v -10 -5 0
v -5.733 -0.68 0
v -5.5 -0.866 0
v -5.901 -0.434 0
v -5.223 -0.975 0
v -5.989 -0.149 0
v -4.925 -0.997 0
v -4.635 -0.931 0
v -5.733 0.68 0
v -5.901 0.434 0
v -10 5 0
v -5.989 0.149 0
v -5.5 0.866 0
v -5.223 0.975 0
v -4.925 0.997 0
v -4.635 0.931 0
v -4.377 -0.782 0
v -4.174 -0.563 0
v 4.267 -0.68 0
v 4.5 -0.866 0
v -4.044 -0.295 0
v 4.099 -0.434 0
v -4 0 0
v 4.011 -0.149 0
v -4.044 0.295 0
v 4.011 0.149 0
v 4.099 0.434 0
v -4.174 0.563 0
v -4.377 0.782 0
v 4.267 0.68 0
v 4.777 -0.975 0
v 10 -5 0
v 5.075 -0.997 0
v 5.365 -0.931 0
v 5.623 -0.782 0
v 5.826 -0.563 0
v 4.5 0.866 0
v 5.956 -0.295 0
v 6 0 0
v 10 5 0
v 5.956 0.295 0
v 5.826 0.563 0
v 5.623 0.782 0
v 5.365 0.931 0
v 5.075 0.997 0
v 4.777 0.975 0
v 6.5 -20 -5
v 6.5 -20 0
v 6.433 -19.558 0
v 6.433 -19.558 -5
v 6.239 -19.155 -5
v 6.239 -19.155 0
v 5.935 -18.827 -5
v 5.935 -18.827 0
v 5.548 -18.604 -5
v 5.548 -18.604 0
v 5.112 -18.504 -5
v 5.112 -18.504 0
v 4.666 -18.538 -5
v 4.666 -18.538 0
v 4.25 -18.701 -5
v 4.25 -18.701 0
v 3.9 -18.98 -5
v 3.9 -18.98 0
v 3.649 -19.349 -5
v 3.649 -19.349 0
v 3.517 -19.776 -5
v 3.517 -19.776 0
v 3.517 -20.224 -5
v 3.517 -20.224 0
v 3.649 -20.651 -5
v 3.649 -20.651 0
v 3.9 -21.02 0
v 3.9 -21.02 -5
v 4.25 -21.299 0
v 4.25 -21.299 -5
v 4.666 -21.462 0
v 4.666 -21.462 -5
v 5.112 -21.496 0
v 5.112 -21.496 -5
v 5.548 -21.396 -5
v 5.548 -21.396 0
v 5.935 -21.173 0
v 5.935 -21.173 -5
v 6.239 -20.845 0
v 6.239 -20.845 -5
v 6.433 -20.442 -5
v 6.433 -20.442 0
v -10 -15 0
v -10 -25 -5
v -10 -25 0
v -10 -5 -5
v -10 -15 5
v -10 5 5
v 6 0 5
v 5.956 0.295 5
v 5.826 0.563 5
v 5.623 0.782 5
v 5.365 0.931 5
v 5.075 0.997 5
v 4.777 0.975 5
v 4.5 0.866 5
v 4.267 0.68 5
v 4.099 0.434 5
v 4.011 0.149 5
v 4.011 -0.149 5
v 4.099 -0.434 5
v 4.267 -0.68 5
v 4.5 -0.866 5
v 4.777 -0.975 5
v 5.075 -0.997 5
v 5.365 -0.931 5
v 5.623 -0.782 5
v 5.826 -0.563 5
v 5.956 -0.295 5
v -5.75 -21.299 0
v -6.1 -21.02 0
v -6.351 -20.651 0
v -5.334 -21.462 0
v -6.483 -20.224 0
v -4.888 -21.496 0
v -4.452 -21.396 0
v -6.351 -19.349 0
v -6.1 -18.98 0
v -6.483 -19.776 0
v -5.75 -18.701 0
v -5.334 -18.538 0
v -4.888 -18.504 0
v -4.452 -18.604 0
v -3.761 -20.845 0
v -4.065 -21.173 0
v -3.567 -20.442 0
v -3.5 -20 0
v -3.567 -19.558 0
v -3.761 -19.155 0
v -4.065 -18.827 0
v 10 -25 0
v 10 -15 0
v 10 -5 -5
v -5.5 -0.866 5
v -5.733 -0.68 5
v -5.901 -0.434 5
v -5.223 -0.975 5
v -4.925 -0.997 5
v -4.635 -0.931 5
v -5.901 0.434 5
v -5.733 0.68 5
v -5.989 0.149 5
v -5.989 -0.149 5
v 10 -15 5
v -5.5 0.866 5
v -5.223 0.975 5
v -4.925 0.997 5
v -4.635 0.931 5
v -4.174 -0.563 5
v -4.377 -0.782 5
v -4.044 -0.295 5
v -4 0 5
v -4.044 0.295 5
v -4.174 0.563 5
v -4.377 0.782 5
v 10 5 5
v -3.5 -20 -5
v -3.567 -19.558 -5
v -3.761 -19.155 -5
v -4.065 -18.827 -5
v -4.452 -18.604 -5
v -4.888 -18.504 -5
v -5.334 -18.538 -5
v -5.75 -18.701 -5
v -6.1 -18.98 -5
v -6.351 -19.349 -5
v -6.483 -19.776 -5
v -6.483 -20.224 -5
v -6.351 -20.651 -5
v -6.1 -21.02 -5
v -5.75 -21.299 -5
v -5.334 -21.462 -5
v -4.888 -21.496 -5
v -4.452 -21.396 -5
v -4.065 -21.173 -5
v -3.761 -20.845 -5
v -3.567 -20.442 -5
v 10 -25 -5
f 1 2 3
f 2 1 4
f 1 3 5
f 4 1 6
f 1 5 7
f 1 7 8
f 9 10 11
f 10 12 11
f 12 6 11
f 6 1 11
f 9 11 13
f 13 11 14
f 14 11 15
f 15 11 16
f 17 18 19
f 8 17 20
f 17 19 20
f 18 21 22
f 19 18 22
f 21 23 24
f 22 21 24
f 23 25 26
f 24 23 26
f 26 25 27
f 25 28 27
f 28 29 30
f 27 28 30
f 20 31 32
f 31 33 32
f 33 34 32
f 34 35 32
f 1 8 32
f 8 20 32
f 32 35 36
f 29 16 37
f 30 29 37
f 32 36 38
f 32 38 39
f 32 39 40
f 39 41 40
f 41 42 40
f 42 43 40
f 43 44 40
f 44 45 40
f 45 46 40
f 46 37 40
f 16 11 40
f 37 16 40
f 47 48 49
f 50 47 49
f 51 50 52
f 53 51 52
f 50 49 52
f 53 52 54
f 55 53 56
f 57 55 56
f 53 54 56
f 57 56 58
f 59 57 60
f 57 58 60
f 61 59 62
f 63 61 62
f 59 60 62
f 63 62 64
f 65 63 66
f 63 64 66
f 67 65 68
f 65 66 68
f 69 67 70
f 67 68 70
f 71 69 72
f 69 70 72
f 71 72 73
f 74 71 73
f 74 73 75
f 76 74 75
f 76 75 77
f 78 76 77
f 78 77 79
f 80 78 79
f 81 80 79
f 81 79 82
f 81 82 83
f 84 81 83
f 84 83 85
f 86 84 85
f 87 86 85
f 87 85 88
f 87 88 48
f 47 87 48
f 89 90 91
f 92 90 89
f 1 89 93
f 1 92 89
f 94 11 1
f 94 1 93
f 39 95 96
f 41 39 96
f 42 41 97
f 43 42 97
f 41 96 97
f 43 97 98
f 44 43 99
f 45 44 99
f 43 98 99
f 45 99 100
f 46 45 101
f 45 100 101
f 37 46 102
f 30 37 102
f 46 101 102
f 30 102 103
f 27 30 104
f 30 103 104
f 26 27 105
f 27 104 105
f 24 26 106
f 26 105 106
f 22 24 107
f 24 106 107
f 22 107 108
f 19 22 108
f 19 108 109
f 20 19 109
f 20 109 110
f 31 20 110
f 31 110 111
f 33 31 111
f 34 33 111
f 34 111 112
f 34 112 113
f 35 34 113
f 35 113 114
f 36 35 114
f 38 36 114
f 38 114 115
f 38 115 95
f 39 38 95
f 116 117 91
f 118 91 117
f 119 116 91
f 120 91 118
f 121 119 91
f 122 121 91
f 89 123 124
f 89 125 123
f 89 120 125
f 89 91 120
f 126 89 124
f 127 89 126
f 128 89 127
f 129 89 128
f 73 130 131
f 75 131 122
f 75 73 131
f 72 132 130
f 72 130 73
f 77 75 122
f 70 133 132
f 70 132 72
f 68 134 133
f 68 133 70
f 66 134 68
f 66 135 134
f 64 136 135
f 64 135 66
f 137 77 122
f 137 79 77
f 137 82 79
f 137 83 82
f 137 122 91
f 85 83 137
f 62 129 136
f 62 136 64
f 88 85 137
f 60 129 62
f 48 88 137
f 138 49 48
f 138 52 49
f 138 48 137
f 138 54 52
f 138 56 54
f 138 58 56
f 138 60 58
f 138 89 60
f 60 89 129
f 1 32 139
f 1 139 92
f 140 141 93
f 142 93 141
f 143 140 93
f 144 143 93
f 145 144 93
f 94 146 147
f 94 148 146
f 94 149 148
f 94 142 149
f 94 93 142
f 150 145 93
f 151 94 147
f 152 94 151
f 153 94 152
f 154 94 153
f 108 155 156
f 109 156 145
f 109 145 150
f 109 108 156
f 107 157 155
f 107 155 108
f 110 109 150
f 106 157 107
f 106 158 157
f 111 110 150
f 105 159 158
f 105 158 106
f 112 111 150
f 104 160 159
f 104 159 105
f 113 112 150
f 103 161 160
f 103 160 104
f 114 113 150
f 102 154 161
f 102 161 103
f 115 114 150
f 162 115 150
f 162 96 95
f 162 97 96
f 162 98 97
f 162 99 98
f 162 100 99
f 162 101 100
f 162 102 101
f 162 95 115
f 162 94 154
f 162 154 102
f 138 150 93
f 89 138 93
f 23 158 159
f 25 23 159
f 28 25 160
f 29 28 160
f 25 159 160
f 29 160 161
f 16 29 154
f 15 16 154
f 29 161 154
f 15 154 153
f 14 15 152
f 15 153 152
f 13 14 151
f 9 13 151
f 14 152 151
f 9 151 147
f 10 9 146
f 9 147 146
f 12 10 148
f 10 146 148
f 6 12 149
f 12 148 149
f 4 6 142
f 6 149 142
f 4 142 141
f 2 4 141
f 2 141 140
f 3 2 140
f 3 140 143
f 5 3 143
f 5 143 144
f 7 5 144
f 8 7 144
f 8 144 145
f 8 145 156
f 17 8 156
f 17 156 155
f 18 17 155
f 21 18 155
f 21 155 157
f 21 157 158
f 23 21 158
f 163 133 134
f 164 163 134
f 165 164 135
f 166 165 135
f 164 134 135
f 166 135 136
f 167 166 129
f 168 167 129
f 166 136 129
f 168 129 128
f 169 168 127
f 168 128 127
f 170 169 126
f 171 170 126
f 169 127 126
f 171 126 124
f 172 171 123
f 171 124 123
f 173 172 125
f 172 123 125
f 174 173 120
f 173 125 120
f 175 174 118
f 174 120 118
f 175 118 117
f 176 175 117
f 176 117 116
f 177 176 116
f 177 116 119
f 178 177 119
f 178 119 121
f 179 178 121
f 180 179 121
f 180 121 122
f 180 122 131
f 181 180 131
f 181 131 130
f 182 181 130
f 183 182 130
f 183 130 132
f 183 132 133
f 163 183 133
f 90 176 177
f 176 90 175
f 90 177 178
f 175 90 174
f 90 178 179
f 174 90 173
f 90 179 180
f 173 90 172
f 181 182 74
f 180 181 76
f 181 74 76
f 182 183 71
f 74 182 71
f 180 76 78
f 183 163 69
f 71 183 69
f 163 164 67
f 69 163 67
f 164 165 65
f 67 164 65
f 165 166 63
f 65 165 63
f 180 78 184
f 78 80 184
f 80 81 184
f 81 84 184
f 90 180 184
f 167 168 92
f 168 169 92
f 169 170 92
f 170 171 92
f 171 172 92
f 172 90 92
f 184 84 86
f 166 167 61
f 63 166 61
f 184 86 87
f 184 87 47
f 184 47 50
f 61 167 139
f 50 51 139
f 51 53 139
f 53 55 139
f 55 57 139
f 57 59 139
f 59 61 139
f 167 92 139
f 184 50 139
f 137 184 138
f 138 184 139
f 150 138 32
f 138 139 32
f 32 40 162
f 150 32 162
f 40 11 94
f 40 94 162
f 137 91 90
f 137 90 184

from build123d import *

# Parameters (mm, degrees)
SKETCH1_W           = 20
SKETCH1_H           = 10
BOSS_EXTRUDE1_DEPTH = 5
SKETCH2_W           = 20
SKETCH2_H           = 5
BOSS_EXTRUDE2_DEPTH = 10
SKETCH3_W           = 20
SKETCH3_H           = 10
BOSS_EXTRUDE3_DEPTH = 5
SKETCH5_R           = 1
CUT_EXTRUDE1_DEPTH  = 10
SKETCH7_W           = 20
SKETCH7_H           = 5
BOSS_EXTRUDE5_DEPTH = 10
SKETCH8_R           = 1.5
CUT_EXTRUDE3_DEPTH  = 10


with BuildPart() as part:
    # Sketch1 → Boss-Extrude1 (new body)
    with BuildSketch(Plane.XY):
        Rectangle(SKETCH1_W, SKETCH1_H)
    extrude(amount=BOSS_EXTRUDE1_DEPTH)

    # Sketch2 → Boss-Extrude2 (add)
    with BuildSketch(Plane.XZ.offset(5)):
        with Locations((0, 2.5)):
            Rectangle(SKETCH2_W, SKETCH2_H)
    extrude(amount=BOSS_EXTRUDE2_DEPTH)

    # Sketch3 → Boss-Extrude3 (add)
    with BuildSketch(Plane(origin=(0, 0, 0), x_dir=(-1, 0, 0), z_dir=(0, 0, -1))):
        with Locations((0, -10)):
            Rectangle(SKETCH3_W, SKETCH3_H)
    extrude(amount=BOSS_EXTRUDE3_DEPTH)

    # Sketch5 → Cut-Extrude1 (cut)
    with BuildSketch(Plane.XY.offset(5)):
        with Locations((-5, 0)):
            Circle(SKETCH5_R)
        with Locations((5, 0)):
            Circle(SKETCH5_R)
    extrude(amount=-CUT_EXTRUDE1_DEPTH, mode=Mode.SUBTRACT)

    # Sketch7 → Boss-Extrude5 (add)
    with BuildSketch(Plane.XZ.offset(15)):
        with Locations((0, -2.5)):
            Rectangle(SKETCH7_W, SKETCH7_H)
    extrude(amount=BOSS_EXTRUDE5_DEPTH)

    # Sketch8 → Cut-Extrude3 (cut)
    with BuildSketch(Plane.XY):
        with Locations((-5, -20)):
            Circle(SKETCH8_R)
        with Locations((5, -20)):
            Circle(SKETCH8_R)
    extrude(amount=-CUT_EXTRUDE3_DEPTH, mode=Mode.SUBTRACT)


solid = part.part
